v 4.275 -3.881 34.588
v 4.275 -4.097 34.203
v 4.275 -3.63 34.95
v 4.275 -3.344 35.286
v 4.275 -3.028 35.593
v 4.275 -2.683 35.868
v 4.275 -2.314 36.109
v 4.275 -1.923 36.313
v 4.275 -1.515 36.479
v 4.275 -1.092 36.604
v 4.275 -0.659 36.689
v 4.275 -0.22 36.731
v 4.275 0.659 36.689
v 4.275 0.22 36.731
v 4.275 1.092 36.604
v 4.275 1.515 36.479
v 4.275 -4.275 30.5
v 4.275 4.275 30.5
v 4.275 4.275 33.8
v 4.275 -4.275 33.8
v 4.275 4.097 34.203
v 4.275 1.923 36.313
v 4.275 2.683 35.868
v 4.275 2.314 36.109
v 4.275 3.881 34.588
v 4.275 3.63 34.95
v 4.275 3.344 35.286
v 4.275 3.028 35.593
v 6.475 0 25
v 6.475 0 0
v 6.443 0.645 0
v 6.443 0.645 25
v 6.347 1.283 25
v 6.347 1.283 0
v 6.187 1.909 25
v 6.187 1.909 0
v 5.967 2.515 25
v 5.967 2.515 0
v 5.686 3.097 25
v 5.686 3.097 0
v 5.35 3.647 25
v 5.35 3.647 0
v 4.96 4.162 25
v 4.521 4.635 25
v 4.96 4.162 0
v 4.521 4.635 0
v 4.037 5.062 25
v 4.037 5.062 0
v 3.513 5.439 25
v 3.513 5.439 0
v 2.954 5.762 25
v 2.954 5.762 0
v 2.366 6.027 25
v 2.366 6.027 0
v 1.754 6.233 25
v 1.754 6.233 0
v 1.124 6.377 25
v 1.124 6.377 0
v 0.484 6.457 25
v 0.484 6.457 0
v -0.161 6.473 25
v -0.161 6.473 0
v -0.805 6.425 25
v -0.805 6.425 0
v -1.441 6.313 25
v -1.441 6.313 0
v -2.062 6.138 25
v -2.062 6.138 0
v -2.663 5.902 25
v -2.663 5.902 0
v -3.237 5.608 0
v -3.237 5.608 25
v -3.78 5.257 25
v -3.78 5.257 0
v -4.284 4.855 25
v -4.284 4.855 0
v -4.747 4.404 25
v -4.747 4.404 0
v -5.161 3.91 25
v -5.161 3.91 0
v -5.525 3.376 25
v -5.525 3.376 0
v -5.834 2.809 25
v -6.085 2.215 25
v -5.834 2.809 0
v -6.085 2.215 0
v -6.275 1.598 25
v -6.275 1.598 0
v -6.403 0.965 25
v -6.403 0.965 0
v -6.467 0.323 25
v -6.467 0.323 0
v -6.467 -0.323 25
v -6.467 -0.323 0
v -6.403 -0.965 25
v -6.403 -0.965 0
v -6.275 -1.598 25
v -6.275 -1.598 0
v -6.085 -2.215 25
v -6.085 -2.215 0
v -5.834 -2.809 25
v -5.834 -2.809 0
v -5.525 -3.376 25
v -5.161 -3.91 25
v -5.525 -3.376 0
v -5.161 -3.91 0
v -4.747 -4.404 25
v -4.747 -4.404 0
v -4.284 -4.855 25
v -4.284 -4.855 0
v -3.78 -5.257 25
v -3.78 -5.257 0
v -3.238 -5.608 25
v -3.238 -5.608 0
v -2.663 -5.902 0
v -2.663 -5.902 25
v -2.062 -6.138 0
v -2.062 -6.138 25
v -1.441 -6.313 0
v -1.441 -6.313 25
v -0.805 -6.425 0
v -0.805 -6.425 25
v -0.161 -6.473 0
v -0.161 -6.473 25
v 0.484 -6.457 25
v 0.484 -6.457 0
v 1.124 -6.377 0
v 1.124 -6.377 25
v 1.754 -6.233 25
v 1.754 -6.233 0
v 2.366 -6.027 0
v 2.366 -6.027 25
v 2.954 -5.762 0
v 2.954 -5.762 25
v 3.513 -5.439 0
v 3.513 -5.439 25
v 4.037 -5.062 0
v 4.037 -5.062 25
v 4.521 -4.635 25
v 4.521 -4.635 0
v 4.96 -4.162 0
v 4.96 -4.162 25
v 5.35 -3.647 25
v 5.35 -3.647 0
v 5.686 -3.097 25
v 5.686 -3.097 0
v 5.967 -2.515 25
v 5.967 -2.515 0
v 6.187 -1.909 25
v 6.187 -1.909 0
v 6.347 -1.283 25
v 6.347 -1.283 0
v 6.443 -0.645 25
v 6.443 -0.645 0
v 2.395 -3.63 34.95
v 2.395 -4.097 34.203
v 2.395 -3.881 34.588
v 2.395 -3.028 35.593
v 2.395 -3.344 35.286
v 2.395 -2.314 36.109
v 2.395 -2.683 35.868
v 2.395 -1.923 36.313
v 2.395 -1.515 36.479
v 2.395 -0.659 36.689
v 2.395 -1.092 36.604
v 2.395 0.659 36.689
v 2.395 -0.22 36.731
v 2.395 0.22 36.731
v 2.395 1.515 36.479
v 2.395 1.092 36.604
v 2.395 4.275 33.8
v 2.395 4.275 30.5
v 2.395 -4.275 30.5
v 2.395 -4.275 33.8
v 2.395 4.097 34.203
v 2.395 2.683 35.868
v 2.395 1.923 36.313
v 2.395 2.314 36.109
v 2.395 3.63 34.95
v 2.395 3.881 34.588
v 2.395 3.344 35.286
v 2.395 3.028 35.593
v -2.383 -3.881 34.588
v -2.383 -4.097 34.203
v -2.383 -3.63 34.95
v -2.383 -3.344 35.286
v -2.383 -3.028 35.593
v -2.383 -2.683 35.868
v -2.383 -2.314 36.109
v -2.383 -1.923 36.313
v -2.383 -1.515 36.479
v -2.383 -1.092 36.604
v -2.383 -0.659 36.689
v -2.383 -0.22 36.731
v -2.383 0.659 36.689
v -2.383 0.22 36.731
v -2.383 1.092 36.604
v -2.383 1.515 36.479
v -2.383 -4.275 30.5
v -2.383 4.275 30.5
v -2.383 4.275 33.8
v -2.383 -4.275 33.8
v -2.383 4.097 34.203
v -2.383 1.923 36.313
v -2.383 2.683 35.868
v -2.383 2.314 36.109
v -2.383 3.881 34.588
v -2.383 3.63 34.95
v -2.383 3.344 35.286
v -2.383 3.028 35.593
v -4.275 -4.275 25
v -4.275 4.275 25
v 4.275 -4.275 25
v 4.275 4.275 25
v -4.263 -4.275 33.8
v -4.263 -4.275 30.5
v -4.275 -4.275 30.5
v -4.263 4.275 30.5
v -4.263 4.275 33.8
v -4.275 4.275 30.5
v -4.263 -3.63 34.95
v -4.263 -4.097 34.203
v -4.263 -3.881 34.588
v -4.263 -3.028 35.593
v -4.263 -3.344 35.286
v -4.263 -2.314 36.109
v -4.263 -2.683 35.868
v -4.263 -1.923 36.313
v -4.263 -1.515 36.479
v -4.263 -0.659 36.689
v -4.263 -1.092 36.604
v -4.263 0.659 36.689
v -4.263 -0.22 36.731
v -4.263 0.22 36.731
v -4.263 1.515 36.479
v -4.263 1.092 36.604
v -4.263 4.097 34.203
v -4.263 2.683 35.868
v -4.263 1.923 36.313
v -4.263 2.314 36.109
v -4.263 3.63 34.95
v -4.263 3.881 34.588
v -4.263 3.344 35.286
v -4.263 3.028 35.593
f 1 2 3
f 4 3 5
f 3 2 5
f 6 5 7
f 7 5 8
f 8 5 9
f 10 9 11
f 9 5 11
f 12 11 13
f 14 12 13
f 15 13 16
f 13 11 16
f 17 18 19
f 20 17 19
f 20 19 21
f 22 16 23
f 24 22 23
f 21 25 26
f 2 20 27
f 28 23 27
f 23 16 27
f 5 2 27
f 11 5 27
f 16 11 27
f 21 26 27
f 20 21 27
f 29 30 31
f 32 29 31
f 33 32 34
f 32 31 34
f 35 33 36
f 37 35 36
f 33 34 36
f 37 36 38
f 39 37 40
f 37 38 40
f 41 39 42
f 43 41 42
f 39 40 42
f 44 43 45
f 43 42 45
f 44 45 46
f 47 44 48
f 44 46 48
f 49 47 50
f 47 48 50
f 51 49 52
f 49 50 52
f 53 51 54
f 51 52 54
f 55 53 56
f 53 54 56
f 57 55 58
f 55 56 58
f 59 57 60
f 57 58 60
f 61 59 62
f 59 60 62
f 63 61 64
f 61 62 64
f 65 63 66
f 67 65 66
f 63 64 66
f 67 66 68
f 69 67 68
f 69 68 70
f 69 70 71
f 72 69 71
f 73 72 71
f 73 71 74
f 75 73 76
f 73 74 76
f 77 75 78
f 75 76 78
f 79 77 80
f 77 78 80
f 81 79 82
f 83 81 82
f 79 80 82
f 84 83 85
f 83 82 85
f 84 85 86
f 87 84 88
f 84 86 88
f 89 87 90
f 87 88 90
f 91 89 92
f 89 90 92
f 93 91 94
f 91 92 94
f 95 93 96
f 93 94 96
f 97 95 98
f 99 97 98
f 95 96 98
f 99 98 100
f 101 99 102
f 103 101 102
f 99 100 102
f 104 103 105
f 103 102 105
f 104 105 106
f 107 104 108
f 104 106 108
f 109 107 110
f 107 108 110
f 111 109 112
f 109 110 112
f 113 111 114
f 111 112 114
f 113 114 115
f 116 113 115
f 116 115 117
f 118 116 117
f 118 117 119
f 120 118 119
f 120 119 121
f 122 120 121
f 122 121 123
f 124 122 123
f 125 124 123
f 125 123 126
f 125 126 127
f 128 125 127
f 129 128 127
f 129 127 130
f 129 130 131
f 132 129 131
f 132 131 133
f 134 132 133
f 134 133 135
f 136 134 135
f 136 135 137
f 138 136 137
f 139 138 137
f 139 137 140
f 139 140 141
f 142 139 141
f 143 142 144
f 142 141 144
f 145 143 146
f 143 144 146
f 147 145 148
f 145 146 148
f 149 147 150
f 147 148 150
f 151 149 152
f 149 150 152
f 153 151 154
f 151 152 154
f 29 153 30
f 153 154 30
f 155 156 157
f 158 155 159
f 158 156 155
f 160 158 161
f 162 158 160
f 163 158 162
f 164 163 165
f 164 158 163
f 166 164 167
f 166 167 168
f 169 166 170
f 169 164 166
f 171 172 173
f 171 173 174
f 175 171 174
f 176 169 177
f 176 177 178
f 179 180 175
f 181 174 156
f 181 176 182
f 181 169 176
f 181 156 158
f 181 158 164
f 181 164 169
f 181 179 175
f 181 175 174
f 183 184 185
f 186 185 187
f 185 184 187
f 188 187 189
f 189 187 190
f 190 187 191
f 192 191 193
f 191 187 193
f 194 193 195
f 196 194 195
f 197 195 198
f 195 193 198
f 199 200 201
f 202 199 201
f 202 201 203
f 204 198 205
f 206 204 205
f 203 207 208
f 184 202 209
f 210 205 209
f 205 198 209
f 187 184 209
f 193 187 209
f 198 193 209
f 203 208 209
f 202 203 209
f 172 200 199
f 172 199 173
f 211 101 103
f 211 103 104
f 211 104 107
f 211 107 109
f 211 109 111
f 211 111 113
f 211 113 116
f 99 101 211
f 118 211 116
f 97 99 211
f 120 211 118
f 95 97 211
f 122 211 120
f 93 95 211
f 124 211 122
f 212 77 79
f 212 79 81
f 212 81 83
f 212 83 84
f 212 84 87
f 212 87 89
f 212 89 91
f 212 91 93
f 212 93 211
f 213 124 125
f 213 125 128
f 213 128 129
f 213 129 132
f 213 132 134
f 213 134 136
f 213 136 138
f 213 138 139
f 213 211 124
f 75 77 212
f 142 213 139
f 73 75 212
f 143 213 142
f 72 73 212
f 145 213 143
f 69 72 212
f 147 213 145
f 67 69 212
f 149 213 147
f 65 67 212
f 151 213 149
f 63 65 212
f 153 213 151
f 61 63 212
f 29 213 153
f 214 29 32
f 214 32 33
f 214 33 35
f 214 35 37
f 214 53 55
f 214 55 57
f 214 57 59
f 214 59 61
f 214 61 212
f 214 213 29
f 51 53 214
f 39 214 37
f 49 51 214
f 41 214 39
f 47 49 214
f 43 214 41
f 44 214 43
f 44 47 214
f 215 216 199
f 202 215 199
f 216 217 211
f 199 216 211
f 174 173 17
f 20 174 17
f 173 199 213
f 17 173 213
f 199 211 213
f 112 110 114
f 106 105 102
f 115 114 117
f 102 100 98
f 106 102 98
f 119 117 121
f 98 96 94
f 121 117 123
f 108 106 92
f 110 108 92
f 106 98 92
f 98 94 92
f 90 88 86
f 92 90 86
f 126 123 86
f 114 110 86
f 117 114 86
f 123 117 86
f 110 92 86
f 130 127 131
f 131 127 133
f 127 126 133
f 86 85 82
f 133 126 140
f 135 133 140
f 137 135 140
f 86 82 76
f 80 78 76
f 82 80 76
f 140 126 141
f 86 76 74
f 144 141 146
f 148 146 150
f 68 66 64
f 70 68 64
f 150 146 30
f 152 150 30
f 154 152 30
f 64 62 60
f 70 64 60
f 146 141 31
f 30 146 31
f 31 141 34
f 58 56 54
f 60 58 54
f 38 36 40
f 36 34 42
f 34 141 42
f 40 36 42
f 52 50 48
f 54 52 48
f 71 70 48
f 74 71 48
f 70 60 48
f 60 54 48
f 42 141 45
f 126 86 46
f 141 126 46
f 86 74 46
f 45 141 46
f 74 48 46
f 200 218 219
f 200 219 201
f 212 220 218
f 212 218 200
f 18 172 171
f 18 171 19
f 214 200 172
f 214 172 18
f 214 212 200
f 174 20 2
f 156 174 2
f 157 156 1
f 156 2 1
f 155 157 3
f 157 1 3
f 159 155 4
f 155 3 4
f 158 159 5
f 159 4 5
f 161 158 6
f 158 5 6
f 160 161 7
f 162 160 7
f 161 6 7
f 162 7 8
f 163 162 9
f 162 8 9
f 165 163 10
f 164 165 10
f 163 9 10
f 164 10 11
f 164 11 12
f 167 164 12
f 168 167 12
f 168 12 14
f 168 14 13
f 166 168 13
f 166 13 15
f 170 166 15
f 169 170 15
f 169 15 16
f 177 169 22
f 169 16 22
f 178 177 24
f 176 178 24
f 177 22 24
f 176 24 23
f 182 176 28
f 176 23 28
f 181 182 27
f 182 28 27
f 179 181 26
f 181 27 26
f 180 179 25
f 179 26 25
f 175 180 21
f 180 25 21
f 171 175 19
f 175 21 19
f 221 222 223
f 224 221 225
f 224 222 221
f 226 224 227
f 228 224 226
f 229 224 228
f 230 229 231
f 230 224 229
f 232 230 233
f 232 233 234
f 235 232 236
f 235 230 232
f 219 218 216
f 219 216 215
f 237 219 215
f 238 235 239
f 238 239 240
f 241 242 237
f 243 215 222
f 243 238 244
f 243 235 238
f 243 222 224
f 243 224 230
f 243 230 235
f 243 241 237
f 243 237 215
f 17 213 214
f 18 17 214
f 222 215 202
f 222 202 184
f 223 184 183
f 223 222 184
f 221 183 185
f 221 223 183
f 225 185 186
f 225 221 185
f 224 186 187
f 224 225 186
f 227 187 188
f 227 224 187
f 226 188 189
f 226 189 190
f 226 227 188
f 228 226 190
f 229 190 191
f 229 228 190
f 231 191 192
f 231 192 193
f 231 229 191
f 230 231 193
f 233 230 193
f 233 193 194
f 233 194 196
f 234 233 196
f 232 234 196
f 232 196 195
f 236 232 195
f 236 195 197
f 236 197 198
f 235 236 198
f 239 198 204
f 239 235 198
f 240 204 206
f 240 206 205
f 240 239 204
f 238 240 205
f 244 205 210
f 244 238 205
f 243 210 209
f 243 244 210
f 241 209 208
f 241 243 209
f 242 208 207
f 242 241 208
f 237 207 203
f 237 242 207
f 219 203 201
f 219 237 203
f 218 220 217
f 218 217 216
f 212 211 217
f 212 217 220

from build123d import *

# Parameters (mm, degrees)
SKETCH1_R           = 6.475
BOSS_EXTRUDE1_DEPTH = 25
SKETCH5_W           = 8.55
SKETCH5_H           = 8.55
BOSS_EXTRUDE2_DEPTH = 5.5
SKETCH10_W          = 1.88
SKETCH10_H          = 8.55
BOSS_EXTRUDE3_DEPTH = 3.3
SKETCH8_W           = 1.88
SKETCH8_H           = 8.55
BOSS_EXTRUDE4_DEPTH = 3.3
BOSS_EXTRUDE5_DEPTH = 1.88
BOSS_EXTRUDE6_DEPTH = 1.88


with BuildPart() as part:
    # Sketch1 → Boss-Extrude1 (new body)
    with BuildSketch(Plane.XY):
        Circle(SKETCH1_R)
    extrude(amount=BOSS_EXTRUDE1_DEPTH)

    # Sketch5 → Boss-Extrude2 (add)
    with BuildSketch(Plane.XY.offset(25)):
        Rectangle(SKETCH5_W, SKETCH5_H)
    extrude(amount=BOSS_EXTRUDE2_DEPTH)

    # Sketch10 → Boss-Extrude3 (add)
    with BuildSketch(Plane.XY.offset(30.5)):
        with Locations((-3.322891498, 0)):
            Rectangle(SKETCH10_W, SKETCH10_H)
    extrude(amount=BOSS_EXTRUDE3_DEPTH)

    # Sketch8 → Boss-Extrude4 (add)
    with BuildSketch(Plane.XY.offset(30.5)):
        with Locations((3.335018839, 0)):
            Rectangle(SKETCH8_W, SKETCH8_H)
    extrude(amount=BOSS_EXTRUDE4_DEPTH)

    # Sketch11 → Boss-Extrude5 (add)
    with BuildSketch(Plane(origin=(4.275018839, 0, 0), x_dir=(0, 0, -1), z_dir=(1, 0, 0))):
        with BuildLine():
            Line((-33.8, 4.275), (-33.8, -4.275))
            ThreePointArc((-33.8, -4.275), (-36.736596519, 0), (-33.8, 4.275))
        make_face()
    extrude(amount=-BOSS_EXTRUDE5_DEPTH)

    # Sketch12 → Boss-Extrude6 (add)
    with BuildSketch(Plane.ZY.offset(4.262891498)):
        with BuildLine():
            Line((33.8, 4.275), (33.8, -4.275))
            ThreePointArc((33.8, -4.275), (36.736596519, 0), (33.8, 4.275))
        make_face()
    extrude(amount=-BOSS_EXTRUDE6_DEPTH)


solid = part.part
